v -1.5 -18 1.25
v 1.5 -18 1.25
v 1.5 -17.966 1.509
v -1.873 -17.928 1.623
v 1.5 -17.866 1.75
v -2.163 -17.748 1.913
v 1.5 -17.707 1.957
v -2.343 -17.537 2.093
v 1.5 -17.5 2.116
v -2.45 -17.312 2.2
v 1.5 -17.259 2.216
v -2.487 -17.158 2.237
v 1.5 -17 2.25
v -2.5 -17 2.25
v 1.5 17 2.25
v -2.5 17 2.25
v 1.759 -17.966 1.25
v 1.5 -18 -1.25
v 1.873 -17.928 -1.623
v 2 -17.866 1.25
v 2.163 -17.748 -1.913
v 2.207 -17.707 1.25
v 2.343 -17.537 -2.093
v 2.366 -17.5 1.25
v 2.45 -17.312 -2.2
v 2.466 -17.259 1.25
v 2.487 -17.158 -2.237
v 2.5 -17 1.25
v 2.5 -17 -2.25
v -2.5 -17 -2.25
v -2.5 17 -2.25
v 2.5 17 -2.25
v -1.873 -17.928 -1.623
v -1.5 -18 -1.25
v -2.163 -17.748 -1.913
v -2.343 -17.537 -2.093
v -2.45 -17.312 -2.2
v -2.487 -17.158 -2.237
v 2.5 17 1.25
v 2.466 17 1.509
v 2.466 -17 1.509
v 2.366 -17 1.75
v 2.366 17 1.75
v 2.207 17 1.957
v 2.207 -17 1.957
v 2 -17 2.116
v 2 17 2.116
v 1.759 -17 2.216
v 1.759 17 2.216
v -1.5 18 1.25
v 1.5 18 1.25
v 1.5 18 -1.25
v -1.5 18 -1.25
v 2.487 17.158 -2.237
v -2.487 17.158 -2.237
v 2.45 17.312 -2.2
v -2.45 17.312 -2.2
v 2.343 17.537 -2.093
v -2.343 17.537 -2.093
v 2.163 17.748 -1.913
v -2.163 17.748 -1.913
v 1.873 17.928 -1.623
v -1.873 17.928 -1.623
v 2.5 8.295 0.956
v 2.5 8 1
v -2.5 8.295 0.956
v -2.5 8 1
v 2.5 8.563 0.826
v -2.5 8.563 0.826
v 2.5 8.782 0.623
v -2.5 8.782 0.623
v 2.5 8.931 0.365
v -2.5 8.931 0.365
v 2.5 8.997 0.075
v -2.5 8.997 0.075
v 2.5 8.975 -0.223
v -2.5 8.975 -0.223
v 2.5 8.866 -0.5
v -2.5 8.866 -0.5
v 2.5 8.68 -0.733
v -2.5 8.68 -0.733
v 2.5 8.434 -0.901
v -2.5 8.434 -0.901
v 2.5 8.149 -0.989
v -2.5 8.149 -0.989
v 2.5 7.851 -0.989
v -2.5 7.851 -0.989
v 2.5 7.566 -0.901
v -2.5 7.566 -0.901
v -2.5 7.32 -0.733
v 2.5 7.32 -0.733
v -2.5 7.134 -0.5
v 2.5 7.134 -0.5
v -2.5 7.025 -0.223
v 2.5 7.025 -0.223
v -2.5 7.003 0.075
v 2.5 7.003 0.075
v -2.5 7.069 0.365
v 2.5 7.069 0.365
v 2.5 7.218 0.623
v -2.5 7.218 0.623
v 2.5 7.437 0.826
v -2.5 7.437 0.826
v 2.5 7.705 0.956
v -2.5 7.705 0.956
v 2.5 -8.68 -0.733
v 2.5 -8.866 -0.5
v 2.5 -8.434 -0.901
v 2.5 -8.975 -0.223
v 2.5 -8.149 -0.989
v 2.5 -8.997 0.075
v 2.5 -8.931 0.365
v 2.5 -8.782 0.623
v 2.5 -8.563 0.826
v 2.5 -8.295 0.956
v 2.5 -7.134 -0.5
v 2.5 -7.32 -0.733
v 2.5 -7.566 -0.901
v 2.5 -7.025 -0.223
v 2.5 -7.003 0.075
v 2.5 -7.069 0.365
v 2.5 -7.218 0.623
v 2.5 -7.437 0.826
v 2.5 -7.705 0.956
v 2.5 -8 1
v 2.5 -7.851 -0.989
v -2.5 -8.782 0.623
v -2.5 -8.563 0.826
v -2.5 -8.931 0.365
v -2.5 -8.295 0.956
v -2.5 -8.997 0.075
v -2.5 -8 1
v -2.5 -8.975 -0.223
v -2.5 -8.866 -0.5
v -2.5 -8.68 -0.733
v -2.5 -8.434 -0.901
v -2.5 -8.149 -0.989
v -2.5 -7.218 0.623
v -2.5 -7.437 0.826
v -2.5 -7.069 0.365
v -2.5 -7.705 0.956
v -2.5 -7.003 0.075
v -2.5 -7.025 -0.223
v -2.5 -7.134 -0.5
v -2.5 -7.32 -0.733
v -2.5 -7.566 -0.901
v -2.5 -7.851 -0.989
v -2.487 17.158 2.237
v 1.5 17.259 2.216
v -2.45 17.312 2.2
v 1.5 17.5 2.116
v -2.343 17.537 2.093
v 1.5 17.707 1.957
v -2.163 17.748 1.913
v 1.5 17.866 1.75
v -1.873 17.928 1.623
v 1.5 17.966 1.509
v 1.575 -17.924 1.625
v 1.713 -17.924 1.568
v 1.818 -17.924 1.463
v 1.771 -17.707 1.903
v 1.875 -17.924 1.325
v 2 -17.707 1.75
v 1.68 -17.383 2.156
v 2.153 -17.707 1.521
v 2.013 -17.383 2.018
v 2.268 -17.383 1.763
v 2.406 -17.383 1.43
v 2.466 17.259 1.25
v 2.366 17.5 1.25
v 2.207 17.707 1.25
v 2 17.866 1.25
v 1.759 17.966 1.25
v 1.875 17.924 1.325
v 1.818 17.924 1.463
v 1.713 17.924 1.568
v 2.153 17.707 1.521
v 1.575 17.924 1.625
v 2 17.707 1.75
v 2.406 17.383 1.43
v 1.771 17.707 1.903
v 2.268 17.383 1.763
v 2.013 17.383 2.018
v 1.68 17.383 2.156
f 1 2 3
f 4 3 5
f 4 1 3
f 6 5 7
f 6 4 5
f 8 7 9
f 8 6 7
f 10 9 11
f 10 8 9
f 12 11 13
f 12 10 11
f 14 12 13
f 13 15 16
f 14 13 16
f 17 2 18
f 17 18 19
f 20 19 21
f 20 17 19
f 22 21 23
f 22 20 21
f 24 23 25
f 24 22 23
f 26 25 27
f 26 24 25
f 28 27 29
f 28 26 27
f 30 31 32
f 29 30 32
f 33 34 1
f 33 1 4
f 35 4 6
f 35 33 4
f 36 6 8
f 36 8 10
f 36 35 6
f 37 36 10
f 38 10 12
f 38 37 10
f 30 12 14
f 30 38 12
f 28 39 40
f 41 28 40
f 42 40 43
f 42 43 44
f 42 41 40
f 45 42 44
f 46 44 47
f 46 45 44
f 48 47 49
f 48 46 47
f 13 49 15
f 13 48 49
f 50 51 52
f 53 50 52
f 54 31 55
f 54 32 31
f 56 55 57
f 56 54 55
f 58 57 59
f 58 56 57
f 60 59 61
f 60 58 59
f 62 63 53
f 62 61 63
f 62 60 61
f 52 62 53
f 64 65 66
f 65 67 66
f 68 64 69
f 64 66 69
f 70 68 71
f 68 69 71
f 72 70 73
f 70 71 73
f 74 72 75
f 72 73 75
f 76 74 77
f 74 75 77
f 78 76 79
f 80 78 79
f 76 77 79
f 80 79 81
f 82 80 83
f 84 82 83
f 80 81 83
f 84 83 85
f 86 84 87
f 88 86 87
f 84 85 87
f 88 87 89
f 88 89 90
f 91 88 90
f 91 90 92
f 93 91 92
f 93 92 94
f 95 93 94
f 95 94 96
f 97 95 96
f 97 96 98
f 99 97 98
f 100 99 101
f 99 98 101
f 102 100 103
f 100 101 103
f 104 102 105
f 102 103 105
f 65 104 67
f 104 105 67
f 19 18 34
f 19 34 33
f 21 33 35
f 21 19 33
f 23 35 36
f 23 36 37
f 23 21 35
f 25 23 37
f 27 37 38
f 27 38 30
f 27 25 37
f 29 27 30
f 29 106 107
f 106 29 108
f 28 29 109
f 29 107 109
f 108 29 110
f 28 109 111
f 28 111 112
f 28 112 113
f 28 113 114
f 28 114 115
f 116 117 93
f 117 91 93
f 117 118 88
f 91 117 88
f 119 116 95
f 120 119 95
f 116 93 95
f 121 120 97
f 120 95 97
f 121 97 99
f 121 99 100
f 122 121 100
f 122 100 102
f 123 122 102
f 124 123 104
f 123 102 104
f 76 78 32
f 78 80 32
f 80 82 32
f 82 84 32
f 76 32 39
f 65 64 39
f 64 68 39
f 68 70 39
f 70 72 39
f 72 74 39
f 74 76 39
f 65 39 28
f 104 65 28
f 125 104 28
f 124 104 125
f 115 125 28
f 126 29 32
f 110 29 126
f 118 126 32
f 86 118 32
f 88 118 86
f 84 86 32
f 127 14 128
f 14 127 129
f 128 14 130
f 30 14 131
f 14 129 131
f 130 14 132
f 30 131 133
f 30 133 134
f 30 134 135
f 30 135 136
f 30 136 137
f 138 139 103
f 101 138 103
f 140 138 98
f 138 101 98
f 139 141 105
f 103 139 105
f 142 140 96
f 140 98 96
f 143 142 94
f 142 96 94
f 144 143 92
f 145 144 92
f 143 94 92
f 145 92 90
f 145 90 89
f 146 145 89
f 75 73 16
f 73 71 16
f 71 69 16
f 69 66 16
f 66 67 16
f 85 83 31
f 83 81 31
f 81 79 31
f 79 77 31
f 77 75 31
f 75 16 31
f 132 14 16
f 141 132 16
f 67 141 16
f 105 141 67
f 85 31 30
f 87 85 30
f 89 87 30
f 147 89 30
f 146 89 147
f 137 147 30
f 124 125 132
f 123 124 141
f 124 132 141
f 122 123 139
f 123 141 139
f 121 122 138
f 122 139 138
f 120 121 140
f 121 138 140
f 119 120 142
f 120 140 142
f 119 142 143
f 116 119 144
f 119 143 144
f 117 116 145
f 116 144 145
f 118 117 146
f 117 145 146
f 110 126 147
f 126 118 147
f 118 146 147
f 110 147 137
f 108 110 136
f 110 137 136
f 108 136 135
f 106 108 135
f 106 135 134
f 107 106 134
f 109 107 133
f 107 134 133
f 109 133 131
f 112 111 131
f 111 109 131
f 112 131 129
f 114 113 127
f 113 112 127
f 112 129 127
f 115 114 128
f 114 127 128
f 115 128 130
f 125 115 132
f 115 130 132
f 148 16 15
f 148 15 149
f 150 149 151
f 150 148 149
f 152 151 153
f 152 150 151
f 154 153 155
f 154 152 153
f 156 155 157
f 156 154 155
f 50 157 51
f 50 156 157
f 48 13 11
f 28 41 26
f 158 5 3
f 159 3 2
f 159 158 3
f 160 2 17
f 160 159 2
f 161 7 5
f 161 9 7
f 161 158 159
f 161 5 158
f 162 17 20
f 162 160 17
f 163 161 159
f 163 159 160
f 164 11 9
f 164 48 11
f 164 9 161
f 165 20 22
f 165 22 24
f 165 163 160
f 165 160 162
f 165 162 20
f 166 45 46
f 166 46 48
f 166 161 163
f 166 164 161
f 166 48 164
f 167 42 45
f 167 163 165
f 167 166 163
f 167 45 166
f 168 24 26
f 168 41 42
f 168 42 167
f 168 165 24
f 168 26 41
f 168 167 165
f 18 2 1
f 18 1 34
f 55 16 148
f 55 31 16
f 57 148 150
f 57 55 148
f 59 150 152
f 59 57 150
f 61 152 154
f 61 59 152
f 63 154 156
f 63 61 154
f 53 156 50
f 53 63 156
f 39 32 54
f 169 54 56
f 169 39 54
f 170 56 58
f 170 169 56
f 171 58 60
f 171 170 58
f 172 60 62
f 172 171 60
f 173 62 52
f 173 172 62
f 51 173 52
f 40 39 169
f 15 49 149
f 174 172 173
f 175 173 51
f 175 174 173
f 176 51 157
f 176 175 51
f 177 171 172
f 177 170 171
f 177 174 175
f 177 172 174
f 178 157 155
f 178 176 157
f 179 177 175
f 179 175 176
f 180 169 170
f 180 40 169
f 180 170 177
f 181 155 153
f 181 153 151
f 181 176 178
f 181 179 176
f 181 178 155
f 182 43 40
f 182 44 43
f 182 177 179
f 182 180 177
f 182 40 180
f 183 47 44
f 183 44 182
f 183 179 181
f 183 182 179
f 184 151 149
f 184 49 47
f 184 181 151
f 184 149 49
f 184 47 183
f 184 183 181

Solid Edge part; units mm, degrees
sketch "Sketch1" plane through (0, 0, 0) normal (0, -1, 0) x (1, 0, 0)
  line L0 (-2.5, -2.25) -> (2.5, -2.25)
  line L1 (2.5, -2.25) -> (2.5, 2.25)
  line L2 (2.5, 2.25) -> (-2.5, 2.25)
  line L3 (-2.5, 2.25) -> (-2.5, -2.25)
  dimension "D1" = 5
  dimension "D2" = 4.5
extrude "Protrusion1" add sketch "Sketch1" along normal mid plane 36
fillet "Round_1" radius 1 1 edges at (2.5, 0, 2.25)
hole "Hole_1" at (-2.5, 8, 0) direction (1, 0, 0) diameter 2 end up to next
mirror "Mirror1" about plane through (0, 0, 0) normal (0, -1, 0) of "Hole_1"
fillet "Round_2" radius 1 5 edges at (-0.5, 18, 2.25) (2.2071, 18, 1.9571) (2.5, 18, -0.5) (-2.5, 18, 0) (0, 18, -2.25)
mirror "Mirror2" about plane through (0, 0, 0) normal (0, -1, 0) of "Round_2"
